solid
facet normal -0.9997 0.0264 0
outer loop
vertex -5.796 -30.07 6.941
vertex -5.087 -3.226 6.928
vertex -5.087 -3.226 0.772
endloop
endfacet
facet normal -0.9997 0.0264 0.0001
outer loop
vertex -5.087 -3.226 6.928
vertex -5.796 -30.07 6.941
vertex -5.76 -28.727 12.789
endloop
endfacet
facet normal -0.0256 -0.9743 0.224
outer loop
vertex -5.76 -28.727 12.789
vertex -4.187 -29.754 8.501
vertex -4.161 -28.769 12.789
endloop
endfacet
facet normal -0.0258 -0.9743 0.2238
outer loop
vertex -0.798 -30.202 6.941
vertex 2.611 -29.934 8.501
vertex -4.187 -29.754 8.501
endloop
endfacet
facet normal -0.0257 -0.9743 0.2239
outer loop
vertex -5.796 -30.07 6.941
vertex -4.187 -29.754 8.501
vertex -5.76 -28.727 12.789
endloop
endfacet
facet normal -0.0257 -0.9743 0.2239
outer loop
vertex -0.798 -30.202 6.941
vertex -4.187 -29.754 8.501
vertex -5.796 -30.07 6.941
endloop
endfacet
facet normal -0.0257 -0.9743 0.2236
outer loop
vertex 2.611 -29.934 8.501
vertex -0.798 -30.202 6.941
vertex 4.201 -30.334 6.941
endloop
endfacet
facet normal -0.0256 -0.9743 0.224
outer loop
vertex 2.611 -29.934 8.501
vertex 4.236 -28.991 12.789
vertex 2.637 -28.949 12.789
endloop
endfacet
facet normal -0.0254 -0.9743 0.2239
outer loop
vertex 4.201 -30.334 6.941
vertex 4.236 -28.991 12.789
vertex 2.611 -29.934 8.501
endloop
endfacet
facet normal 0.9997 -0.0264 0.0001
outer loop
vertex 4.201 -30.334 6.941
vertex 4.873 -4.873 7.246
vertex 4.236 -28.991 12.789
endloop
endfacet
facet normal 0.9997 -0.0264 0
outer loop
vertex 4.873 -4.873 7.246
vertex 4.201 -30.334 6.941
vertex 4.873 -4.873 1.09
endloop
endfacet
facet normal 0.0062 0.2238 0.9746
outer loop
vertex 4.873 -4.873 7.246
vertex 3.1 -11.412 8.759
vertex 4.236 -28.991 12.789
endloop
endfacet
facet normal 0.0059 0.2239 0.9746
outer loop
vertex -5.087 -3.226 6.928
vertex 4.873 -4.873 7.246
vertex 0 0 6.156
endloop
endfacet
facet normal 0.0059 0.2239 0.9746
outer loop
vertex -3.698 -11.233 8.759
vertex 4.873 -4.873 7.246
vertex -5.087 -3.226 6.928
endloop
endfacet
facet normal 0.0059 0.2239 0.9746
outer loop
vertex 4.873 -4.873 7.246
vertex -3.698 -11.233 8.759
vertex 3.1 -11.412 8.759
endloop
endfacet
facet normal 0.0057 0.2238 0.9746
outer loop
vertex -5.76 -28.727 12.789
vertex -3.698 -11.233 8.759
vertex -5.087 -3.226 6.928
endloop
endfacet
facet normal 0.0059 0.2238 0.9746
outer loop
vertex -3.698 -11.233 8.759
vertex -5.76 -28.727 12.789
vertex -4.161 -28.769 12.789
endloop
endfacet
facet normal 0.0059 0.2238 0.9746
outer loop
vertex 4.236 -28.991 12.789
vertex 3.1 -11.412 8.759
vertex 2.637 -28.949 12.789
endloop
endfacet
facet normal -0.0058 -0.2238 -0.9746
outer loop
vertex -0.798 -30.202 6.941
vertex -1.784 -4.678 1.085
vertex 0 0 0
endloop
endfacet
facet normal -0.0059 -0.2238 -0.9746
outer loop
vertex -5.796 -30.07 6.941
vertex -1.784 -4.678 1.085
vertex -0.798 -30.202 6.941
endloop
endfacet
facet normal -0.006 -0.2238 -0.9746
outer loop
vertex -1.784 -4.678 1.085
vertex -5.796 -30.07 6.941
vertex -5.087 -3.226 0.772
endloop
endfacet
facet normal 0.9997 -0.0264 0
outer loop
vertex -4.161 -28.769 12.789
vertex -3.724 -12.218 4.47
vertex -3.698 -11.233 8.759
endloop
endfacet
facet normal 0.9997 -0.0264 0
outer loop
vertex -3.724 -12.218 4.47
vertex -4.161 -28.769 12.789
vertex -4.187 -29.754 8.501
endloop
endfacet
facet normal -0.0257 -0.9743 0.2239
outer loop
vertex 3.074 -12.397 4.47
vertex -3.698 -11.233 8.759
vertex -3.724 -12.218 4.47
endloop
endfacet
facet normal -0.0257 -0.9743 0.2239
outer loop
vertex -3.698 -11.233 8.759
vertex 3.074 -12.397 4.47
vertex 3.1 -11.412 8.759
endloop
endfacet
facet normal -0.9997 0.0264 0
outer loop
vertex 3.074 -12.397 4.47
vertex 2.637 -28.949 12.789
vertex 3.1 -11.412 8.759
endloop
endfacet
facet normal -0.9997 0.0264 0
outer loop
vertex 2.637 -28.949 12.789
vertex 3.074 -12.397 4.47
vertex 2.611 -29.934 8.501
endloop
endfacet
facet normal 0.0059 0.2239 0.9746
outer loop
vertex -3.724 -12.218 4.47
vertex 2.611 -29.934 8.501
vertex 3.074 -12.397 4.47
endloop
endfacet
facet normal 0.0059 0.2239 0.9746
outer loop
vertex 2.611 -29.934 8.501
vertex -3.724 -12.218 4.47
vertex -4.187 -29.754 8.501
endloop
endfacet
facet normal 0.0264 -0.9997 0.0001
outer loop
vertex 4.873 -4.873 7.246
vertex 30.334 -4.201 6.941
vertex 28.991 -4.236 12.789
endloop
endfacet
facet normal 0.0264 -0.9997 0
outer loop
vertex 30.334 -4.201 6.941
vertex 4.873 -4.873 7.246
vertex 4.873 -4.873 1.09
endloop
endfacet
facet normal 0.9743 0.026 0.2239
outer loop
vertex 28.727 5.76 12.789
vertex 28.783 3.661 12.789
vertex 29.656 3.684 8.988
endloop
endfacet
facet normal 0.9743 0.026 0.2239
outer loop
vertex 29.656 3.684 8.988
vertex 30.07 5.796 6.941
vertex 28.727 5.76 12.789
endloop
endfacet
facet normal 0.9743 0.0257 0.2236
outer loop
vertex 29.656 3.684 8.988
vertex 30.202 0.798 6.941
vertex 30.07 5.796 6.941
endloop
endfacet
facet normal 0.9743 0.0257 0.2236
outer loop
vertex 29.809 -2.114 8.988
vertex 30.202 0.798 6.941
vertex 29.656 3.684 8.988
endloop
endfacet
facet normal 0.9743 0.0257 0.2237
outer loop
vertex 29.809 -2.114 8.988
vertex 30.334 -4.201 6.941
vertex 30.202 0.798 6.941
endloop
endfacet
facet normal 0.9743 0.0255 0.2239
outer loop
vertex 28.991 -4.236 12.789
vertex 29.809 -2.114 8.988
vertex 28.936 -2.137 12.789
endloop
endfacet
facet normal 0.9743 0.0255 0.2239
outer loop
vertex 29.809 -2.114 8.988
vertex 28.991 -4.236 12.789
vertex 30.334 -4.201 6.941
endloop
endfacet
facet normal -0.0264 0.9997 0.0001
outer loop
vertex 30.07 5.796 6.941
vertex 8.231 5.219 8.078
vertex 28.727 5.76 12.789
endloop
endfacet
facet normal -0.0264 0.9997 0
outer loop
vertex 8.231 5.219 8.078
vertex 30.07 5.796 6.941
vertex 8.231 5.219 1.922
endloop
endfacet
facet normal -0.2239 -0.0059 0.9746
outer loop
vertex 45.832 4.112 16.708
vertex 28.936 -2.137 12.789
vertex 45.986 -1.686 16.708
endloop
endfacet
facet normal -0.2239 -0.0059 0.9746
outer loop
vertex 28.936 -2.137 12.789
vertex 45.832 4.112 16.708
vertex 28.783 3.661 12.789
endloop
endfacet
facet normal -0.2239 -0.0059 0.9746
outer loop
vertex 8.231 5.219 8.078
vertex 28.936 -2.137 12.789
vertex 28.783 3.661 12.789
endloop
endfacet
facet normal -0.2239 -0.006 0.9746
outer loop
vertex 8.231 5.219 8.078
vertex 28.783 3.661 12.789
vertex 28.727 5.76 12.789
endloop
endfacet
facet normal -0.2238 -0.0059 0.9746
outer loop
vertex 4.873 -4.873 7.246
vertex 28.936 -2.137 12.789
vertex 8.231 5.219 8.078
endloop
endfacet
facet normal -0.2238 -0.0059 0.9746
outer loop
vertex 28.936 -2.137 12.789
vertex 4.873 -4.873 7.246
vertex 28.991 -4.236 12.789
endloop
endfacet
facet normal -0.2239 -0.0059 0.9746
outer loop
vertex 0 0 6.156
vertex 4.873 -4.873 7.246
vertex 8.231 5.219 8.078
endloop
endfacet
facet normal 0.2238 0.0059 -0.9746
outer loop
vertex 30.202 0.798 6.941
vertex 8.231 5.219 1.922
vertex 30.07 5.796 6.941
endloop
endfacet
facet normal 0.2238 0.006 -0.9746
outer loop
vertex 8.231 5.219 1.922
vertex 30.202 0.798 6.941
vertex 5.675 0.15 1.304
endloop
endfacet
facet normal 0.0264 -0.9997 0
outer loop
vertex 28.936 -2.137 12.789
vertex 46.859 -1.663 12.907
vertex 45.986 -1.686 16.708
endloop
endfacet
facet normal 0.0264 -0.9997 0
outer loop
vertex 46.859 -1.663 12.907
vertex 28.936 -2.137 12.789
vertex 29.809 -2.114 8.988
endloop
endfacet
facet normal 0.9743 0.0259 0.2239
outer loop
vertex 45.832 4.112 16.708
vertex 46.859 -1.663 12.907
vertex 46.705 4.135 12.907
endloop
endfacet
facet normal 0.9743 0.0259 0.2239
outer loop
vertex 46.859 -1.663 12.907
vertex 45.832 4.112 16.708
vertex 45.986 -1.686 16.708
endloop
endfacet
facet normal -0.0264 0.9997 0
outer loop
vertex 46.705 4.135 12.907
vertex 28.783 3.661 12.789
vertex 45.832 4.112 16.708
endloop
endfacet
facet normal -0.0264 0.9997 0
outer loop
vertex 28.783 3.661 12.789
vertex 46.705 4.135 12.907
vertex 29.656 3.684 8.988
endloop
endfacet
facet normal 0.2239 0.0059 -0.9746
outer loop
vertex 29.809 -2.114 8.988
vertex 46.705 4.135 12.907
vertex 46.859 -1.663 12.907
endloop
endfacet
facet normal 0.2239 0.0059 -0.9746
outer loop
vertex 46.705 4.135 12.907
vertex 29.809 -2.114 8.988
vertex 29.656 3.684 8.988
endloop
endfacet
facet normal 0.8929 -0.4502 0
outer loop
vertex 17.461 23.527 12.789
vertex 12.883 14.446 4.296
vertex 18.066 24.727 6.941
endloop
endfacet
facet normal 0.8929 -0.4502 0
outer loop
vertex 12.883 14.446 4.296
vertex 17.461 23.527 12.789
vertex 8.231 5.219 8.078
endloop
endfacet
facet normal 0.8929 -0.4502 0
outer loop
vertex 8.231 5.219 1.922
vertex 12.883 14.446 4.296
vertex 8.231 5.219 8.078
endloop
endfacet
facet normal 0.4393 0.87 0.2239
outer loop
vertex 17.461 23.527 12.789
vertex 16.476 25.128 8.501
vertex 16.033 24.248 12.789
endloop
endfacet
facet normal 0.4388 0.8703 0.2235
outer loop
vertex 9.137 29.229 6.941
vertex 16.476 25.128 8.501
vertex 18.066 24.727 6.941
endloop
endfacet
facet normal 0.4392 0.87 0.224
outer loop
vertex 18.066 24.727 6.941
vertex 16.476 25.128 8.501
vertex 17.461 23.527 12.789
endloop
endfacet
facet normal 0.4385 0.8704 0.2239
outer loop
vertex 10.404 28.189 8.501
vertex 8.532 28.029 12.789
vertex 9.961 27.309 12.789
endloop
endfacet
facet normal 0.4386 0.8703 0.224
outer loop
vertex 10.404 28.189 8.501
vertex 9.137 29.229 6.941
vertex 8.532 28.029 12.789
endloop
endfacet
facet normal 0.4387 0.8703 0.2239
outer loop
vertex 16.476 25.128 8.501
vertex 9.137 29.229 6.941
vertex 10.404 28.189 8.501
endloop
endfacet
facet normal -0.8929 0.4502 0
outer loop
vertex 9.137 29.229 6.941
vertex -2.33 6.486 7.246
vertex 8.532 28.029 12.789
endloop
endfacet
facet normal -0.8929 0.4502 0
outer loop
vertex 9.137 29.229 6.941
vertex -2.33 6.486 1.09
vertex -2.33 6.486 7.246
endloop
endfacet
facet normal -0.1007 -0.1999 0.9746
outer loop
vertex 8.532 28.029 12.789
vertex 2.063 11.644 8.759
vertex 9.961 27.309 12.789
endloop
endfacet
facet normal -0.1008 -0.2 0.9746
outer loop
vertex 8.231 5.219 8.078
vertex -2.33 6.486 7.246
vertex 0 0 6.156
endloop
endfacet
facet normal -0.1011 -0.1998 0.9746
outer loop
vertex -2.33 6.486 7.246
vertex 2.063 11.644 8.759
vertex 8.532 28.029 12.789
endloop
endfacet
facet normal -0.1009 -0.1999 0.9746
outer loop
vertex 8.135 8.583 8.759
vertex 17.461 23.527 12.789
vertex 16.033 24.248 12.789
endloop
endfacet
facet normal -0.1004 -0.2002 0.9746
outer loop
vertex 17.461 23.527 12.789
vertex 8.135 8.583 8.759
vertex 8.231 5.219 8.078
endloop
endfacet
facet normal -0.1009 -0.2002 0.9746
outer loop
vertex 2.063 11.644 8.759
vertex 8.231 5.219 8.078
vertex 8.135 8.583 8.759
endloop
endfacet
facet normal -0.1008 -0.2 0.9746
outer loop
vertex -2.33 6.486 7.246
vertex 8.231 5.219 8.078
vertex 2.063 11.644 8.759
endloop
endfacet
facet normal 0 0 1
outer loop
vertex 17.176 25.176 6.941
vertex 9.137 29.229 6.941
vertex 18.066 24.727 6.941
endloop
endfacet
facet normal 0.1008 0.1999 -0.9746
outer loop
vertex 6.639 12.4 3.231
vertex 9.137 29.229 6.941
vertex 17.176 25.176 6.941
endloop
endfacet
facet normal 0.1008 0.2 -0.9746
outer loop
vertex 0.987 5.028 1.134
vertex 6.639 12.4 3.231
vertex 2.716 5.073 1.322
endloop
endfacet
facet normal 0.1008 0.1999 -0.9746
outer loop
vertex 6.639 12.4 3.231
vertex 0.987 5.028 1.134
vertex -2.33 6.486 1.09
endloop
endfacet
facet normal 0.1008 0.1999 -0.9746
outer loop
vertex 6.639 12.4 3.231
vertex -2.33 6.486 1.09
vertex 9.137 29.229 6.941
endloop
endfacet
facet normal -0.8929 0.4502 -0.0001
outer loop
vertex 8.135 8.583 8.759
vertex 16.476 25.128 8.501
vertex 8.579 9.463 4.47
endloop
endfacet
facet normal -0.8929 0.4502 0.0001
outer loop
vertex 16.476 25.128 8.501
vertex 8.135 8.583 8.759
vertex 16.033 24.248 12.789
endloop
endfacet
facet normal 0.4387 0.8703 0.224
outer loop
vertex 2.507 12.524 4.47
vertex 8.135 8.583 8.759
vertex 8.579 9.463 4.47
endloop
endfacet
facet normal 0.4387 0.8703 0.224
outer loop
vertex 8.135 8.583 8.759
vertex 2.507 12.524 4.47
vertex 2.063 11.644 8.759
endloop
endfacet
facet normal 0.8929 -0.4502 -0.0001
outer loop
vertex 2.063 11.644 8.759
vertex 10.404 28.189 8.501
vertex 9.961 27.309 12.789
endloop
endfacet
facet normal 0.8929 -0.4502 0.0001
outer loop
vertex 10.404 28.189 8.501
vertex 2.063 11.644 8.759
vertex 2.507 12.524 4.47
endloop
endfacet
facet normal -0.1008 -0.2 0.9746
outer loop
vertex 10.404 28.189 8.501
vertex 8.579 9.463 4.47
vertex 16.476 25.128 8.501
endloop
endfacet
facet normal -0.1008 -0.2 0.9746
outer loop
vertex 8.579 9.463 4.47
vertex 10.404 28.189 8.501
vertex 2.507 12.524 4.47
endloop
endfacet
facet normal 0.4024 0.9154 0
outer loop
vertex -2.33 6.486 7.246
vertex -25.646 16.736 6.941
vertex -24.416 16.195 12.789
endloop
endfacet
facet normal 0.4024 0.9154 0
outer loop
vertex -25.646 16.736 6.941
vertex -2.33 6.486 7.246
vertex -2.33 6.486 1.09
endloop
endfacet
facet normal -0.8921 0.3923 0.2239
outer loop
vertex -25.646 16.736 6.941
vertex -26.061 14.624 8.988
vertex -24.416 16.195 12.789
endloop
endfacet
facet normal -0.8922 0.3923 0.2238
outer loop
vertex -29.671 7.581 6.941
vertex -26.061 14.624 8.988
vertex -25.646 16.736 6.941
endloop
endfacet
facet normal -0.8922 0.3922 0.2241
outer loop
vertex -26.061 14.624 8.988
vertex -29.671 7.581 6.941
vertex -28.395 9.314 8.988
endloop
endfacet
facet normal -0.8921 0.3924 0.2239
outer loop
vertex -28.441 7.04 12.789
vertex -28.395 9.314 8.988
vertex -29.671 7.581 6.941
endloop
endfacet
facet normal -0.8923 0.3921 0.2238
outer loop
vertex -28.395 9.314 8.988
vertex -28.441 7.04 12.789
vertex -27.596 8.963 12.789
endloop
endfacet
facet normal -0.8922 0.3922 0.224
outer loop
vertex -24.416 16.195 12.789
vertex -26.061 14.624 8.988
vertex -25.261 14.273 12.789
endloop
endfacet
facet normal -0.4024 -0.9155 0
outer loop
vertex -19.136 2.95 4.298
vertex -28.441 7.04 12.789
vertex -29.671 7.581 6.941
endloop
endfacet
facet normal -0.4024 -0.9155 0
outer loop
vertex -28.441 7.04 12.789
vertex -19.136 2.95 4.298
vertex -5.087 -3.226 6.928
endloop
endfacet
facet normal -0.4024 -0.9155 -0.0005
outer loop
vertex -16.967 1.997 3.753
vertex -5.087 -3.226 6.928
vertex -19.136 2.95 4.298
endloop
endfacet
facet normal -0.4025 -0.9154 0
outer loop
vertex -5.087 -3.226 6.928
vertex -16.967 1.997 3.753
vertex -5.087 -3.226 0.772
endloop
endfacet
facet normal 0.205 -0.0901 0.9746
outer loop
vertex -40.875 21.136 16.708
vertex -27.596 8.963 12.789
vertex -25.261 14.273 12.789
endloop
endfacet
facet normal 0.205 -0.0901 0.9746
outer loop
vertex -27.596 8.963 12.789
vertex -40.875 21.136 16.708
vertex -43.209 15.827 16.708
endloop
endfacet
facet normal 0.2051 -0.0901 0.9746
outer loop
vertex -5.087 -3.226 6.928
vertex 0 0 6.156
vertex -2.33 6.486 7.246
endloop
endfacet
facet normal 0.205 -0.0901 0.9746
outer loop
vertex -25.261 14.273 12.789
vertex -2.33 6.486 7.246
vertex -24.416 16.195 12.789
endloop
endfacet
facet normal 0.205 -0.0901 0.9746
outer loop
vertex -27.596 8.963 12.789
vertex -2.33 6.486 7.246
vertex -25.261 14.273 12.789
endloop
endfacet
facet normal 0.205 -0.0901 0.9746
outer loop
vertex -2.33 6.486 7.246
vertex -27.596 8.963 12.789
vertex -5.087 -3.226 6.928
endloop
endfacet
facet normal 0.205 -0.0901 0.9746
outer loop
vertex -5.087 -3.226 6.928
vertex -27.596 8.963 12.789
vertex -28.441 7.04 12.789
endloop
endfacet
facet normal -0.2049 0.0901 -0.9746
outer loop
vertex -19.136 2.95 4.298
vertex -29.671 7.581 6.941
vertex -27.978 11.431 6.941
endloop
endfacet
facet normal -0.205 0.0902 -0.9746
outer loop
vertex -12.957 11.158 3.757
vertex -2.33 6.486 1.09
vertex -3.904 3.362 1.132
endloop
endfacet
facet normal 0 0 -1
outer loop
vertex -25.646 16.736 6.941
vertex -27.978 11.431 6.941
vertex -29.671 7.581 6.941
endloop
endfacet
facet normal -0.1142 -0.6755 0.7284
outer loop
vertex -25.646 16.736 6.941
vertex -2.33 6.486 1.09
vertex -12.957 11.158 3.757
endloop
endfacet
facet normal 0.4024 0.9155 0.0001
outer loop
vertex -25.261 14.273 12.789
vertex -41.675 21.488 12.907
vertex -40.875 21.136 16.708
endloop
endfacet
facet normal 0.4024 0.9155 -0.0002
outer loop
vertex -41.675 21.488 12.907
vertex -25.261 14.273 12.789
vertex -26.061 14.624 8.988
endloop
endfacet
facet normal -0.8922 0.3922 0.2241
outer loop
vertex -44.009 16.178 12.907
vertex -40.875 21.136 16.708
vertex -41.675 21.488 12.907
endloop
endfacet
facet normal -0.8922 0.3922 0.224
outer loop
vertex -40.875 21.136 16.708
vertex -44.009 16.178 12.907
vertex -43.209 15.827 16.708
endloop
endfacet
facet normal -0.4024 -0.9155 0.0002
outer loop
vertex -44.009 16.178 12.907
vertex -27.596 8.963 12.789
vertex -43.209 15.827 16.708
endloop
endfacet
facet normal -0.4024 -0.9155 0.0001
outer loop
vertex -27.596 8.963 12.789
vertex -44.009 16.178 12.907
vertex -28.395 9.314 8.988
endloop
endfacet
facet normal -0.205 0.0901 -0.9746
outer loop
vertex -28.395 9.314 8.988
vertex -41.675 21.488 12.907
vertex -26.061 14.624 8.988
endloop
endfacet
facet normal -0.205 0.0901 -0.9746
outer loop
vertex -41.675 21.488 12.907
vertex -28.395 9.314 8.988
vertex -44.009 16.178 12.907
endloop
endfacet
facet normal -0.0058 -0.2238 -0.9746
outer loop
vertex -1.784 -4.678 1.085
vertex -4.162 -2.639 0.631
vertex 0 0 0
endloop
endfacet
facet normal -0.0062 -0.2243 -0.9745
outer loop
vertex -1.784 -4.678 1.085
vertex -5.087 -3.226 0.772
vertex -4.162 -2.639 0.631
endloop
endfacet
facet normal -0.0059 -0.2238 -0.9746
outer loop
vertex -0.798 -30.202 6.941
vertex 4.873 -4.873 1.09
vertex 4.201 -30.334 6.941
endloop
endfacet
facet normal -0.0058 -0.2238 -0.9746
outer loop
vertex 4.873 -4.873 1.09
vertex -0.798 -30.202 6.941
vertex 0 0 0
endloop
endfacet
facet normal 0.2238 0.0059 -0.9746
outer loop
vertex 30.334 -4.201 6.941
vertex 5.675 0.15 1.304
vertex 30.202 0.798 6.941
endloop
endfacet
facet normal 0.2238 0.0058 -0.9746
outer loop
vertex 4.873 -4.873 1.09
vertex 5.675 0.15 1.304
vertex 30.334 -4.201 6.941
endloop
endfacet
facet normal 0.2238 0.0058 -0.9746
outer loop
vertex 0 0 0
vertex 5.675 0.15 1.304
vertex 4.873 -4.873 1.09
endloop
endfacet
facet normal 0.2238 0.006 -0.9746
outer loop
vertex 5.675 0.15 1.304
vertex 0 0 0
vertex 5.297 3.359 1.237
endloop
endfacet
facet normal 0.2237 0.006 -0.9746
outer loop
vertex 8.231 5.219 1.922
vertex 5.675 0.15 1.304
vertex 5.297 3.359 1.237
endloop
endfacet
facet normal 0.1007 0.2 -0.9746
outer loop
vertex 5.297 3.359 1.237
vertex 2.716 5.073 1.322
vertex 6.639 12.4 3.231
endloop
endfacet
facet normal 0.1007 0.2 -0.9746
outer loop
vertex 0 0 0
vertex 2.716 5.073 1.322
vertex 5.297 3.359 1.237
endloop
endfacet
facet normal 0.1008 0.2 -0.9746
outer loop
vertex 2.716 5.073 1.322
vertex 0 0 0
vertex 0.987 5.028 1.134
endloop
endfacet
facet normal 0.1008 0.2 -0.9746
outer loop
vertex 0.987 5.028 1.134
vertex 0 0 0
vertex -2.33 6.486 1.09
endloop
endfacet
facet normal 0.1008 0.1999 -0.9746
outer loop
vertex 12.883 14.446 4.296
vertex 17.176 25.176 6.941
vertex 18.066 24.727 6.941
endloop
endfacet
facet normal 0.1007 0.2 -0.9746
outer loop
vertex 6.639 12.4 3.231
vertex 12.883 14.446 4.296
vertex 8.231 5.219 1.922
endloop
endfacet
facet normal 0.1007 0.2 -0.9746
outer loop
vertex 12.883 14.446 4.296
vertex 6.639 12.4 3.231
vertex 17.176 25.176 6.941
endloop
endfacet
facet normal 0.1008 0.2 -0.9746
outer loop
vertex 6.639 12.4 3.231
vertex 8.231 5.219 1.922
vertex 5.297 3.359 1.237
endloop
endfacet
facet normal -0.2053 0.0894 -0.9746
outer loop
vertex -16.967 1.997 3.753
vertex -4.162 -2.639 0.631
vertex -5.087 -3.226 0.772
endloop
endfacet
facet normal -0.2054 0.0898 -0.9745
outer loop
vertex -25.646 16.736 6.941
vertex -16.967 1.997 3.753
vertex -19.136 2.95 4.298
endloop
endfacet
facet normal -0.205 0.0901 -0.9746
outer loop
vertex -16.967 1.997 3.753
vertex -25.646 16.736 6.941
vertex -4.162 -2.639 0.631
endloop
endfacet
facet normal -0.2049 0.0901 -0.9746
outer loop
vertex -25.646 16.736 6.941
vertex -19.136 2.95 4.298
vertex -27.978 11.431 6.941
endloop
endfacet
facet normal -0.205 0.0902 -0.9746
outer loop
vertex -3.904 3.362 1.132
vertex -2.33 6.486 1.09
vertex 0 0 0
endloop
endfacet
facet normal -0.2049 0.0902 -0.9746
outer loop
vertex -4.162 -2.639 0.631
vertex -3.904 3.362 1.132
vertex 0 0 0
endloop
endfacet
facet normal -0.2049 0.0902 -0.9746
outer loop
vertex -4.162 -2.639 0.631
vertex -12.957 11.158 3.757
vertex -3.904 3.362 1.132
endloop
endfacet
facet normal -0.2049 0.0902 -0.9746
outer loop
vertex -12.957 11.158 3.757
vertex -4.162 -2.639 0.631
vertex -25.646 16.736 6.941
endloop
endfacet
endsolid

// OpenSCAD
$fn = 128; // smoothness

vertex();
// pipe_holder_cuff();

main_vertex = [1, 1, 4.2360679775];
u = main_vertex / norm(main_vertex);
e_y = [0,1,0];
e_z = [0,0,1];

adjacent_verticies = [
  [1, -1, 4.2360679775],
  [-1, 1, 4.2360679775],
  [0, 2.61803398875, 3.61803398875],
  [2.61803398875, 1.61803398875, 3.2360679775],
];


gap = 0.5;
wall_thickness = 1.6;
spur_offset = 16.666;
spur_height = 2;

MIRROR = 1; // 1;

socket_radius = 21; // For 1.25" schedule 40 PVC pipe
pipe_holder_depth = 12;
pipe_holder_thickness = 3;

cube_dims = [10, 6, 31];
female_dims = [
  cube_dims[0] - 2*wall_thickness,
  cube_dims[1] - wall_thickness,
  18
];
male_dims = female_dims - gap*[2,1,1];

center_length = 2*cube_dims[2] * norm(main_vertex) / norm(adjacent_verticies[0] - main_vertex);
echo(center_length);


module pipe_holder_cuff() {
  difference() {
    // cylinder(r=socket_radius + 2*pipe_holder_thickness, h=pipe_holder_depth/2 + pipe_holder_thickness - 1);
    cylinder(r=socket_radius + 2*pipe_holder_thickness, h=pipe_holder_depth + pipe_holder_thickness - 1);

    cylinder(r=socket_radius+0.5, h=100);

    translate([0, 0, pipe_holder_thickness])
    cylinder(r=socket_radius + pipe_holder_thickness + 1, h=100);
  }
}

module vertex() {
  // suppor_pillar();

  a = -atan2(sqrt(2), main_vertex[2]);
  mirror([MIRROR,0,0])
  rotate(v=[1,-1,0], a=a)
  difference() {
    union() {
      edges();
//      square_support();
    }

    edges_negative();
  }

/*
  module suppor_pillar() {
    difference() {
      translate([0,0,5])
      cylinder(r=cube_dims[0] / 2, h=center_length);

      translate([0,0,center_length])
      sphere(r=102); // 4 inches
    }
  }
*/
  
  module square_support() {
    square_length = cube_dims[2] - cube_dims[0]/2;

    translate([-cube_dims[2], -cube_dims[2], -1]) {
      difference() {
        union() {
          translate([0, 0, -pipe_holder_depth])
          cylinder(r=socket_radius + pipe_holder_thickness , h=3/2*pipe_holder_depth + cube_dims[1]);
          cube([square_length, square_length, cube_dims[1]]);
        }

        translate([0, 0, -pipe_holder_depth - 1]) {
          cylinder(r=socket_radius, h=100);

          translate([-100 + 0.5, -100, 0])
          cube([100, 200, 100]);

          translate([-100, -100 + 0.5, 0])
          cube([200, 100, 100]);
        }
      }
    }
  }

  module edges() {
    for(i = [0:3]) {
      v = adjacent_verticies[i];
      e = (v - main_vertex) / 2;
      
      
      xy = [e[0], e[1], 0];
      a0 = acos((xy * e_y) / norm(xy)) * (e[0] < 0 ? 1:-1);
      
      c = cross(e_z, e);
      a1 = asin(norm(c));
      
      o_p1 = u - (u * e) * e;
      o_p2 = e_z - (e_z * e) * e;
      a2 = acos((o_p1 * o_p2) / norm(o_p1) / norm(o_p2)) * (e[0] < 0 ? -1:1);
      
      rotate(v=c, a=a1)
      rotate(v=[0,0,1], a=a2 + a0 + 180) {
        edge(i%2 == MIRROR);
      }
    }
  }
  
  module edge(male) {
    if (male) {
      union() {
        body();
        
        translate([
            -male_dims[0]/2,
            cube_dims[1] - male_dims[1],
            cube_dims[2]
        ]) {
          cube(male_dims);
        }
      }
    } else {
      difference() {
        body();
        
        translate([
            -female_dims[0]/2,
            cube_dims[1] - female_dims[1],
            cube_dims[2] - female_dims[2]
        ]) {
          cube(female_dims);
        }
      }
    }
    
    module body() {
      translate([-cube_dims[0]/2, 0, 0]) {
        cube(cube_dims);
      }
      // translate([0, cube_dims[1], cube_dims[2] - spur_offset]) {
      //   translate([-cube_dims[0]/2, 0, 0]) {
      //     cube([wall_thickness, spur_height, wall_thickness]);
      //   }
      //   translate([cube_dims[0]/2 - wall_thickness, 0, 0]) {
      //     cube([wall_thickness, spur_height, wall_thickness]);
      //   }
      // }
    }
  }
  
  module edges_negative() {
    for(v = adjacent_verticies) {
      e = (v - main_vertex) / 2;
      
      
      xy = [e[0], e[1], 0];
      a0 = acos((xy * e_y) / norm(xy)) * (e[0] < 0 ? 1:-1);
      
      c = cross(e_z, e);
      a1 = asin(norm(c));
      
      o_p1 = u - (u * e) * e;
      o_p2 = e_z - (e_z * e) * e;
      a2 = acos((o_p1 * o_p2) / norm(o_p1) / norm(o_p2)) * (e[0] < 0 ? -1:1);
      
      rotate(v=c, a=a1)
      rotate(v=[0,0,1], a=a2 + a0 + 180)
      translate([-cube_dims[0]/2, -cube_dims[1], 0]) {
        cube(cube_dims);
      }
    }
  }
}
